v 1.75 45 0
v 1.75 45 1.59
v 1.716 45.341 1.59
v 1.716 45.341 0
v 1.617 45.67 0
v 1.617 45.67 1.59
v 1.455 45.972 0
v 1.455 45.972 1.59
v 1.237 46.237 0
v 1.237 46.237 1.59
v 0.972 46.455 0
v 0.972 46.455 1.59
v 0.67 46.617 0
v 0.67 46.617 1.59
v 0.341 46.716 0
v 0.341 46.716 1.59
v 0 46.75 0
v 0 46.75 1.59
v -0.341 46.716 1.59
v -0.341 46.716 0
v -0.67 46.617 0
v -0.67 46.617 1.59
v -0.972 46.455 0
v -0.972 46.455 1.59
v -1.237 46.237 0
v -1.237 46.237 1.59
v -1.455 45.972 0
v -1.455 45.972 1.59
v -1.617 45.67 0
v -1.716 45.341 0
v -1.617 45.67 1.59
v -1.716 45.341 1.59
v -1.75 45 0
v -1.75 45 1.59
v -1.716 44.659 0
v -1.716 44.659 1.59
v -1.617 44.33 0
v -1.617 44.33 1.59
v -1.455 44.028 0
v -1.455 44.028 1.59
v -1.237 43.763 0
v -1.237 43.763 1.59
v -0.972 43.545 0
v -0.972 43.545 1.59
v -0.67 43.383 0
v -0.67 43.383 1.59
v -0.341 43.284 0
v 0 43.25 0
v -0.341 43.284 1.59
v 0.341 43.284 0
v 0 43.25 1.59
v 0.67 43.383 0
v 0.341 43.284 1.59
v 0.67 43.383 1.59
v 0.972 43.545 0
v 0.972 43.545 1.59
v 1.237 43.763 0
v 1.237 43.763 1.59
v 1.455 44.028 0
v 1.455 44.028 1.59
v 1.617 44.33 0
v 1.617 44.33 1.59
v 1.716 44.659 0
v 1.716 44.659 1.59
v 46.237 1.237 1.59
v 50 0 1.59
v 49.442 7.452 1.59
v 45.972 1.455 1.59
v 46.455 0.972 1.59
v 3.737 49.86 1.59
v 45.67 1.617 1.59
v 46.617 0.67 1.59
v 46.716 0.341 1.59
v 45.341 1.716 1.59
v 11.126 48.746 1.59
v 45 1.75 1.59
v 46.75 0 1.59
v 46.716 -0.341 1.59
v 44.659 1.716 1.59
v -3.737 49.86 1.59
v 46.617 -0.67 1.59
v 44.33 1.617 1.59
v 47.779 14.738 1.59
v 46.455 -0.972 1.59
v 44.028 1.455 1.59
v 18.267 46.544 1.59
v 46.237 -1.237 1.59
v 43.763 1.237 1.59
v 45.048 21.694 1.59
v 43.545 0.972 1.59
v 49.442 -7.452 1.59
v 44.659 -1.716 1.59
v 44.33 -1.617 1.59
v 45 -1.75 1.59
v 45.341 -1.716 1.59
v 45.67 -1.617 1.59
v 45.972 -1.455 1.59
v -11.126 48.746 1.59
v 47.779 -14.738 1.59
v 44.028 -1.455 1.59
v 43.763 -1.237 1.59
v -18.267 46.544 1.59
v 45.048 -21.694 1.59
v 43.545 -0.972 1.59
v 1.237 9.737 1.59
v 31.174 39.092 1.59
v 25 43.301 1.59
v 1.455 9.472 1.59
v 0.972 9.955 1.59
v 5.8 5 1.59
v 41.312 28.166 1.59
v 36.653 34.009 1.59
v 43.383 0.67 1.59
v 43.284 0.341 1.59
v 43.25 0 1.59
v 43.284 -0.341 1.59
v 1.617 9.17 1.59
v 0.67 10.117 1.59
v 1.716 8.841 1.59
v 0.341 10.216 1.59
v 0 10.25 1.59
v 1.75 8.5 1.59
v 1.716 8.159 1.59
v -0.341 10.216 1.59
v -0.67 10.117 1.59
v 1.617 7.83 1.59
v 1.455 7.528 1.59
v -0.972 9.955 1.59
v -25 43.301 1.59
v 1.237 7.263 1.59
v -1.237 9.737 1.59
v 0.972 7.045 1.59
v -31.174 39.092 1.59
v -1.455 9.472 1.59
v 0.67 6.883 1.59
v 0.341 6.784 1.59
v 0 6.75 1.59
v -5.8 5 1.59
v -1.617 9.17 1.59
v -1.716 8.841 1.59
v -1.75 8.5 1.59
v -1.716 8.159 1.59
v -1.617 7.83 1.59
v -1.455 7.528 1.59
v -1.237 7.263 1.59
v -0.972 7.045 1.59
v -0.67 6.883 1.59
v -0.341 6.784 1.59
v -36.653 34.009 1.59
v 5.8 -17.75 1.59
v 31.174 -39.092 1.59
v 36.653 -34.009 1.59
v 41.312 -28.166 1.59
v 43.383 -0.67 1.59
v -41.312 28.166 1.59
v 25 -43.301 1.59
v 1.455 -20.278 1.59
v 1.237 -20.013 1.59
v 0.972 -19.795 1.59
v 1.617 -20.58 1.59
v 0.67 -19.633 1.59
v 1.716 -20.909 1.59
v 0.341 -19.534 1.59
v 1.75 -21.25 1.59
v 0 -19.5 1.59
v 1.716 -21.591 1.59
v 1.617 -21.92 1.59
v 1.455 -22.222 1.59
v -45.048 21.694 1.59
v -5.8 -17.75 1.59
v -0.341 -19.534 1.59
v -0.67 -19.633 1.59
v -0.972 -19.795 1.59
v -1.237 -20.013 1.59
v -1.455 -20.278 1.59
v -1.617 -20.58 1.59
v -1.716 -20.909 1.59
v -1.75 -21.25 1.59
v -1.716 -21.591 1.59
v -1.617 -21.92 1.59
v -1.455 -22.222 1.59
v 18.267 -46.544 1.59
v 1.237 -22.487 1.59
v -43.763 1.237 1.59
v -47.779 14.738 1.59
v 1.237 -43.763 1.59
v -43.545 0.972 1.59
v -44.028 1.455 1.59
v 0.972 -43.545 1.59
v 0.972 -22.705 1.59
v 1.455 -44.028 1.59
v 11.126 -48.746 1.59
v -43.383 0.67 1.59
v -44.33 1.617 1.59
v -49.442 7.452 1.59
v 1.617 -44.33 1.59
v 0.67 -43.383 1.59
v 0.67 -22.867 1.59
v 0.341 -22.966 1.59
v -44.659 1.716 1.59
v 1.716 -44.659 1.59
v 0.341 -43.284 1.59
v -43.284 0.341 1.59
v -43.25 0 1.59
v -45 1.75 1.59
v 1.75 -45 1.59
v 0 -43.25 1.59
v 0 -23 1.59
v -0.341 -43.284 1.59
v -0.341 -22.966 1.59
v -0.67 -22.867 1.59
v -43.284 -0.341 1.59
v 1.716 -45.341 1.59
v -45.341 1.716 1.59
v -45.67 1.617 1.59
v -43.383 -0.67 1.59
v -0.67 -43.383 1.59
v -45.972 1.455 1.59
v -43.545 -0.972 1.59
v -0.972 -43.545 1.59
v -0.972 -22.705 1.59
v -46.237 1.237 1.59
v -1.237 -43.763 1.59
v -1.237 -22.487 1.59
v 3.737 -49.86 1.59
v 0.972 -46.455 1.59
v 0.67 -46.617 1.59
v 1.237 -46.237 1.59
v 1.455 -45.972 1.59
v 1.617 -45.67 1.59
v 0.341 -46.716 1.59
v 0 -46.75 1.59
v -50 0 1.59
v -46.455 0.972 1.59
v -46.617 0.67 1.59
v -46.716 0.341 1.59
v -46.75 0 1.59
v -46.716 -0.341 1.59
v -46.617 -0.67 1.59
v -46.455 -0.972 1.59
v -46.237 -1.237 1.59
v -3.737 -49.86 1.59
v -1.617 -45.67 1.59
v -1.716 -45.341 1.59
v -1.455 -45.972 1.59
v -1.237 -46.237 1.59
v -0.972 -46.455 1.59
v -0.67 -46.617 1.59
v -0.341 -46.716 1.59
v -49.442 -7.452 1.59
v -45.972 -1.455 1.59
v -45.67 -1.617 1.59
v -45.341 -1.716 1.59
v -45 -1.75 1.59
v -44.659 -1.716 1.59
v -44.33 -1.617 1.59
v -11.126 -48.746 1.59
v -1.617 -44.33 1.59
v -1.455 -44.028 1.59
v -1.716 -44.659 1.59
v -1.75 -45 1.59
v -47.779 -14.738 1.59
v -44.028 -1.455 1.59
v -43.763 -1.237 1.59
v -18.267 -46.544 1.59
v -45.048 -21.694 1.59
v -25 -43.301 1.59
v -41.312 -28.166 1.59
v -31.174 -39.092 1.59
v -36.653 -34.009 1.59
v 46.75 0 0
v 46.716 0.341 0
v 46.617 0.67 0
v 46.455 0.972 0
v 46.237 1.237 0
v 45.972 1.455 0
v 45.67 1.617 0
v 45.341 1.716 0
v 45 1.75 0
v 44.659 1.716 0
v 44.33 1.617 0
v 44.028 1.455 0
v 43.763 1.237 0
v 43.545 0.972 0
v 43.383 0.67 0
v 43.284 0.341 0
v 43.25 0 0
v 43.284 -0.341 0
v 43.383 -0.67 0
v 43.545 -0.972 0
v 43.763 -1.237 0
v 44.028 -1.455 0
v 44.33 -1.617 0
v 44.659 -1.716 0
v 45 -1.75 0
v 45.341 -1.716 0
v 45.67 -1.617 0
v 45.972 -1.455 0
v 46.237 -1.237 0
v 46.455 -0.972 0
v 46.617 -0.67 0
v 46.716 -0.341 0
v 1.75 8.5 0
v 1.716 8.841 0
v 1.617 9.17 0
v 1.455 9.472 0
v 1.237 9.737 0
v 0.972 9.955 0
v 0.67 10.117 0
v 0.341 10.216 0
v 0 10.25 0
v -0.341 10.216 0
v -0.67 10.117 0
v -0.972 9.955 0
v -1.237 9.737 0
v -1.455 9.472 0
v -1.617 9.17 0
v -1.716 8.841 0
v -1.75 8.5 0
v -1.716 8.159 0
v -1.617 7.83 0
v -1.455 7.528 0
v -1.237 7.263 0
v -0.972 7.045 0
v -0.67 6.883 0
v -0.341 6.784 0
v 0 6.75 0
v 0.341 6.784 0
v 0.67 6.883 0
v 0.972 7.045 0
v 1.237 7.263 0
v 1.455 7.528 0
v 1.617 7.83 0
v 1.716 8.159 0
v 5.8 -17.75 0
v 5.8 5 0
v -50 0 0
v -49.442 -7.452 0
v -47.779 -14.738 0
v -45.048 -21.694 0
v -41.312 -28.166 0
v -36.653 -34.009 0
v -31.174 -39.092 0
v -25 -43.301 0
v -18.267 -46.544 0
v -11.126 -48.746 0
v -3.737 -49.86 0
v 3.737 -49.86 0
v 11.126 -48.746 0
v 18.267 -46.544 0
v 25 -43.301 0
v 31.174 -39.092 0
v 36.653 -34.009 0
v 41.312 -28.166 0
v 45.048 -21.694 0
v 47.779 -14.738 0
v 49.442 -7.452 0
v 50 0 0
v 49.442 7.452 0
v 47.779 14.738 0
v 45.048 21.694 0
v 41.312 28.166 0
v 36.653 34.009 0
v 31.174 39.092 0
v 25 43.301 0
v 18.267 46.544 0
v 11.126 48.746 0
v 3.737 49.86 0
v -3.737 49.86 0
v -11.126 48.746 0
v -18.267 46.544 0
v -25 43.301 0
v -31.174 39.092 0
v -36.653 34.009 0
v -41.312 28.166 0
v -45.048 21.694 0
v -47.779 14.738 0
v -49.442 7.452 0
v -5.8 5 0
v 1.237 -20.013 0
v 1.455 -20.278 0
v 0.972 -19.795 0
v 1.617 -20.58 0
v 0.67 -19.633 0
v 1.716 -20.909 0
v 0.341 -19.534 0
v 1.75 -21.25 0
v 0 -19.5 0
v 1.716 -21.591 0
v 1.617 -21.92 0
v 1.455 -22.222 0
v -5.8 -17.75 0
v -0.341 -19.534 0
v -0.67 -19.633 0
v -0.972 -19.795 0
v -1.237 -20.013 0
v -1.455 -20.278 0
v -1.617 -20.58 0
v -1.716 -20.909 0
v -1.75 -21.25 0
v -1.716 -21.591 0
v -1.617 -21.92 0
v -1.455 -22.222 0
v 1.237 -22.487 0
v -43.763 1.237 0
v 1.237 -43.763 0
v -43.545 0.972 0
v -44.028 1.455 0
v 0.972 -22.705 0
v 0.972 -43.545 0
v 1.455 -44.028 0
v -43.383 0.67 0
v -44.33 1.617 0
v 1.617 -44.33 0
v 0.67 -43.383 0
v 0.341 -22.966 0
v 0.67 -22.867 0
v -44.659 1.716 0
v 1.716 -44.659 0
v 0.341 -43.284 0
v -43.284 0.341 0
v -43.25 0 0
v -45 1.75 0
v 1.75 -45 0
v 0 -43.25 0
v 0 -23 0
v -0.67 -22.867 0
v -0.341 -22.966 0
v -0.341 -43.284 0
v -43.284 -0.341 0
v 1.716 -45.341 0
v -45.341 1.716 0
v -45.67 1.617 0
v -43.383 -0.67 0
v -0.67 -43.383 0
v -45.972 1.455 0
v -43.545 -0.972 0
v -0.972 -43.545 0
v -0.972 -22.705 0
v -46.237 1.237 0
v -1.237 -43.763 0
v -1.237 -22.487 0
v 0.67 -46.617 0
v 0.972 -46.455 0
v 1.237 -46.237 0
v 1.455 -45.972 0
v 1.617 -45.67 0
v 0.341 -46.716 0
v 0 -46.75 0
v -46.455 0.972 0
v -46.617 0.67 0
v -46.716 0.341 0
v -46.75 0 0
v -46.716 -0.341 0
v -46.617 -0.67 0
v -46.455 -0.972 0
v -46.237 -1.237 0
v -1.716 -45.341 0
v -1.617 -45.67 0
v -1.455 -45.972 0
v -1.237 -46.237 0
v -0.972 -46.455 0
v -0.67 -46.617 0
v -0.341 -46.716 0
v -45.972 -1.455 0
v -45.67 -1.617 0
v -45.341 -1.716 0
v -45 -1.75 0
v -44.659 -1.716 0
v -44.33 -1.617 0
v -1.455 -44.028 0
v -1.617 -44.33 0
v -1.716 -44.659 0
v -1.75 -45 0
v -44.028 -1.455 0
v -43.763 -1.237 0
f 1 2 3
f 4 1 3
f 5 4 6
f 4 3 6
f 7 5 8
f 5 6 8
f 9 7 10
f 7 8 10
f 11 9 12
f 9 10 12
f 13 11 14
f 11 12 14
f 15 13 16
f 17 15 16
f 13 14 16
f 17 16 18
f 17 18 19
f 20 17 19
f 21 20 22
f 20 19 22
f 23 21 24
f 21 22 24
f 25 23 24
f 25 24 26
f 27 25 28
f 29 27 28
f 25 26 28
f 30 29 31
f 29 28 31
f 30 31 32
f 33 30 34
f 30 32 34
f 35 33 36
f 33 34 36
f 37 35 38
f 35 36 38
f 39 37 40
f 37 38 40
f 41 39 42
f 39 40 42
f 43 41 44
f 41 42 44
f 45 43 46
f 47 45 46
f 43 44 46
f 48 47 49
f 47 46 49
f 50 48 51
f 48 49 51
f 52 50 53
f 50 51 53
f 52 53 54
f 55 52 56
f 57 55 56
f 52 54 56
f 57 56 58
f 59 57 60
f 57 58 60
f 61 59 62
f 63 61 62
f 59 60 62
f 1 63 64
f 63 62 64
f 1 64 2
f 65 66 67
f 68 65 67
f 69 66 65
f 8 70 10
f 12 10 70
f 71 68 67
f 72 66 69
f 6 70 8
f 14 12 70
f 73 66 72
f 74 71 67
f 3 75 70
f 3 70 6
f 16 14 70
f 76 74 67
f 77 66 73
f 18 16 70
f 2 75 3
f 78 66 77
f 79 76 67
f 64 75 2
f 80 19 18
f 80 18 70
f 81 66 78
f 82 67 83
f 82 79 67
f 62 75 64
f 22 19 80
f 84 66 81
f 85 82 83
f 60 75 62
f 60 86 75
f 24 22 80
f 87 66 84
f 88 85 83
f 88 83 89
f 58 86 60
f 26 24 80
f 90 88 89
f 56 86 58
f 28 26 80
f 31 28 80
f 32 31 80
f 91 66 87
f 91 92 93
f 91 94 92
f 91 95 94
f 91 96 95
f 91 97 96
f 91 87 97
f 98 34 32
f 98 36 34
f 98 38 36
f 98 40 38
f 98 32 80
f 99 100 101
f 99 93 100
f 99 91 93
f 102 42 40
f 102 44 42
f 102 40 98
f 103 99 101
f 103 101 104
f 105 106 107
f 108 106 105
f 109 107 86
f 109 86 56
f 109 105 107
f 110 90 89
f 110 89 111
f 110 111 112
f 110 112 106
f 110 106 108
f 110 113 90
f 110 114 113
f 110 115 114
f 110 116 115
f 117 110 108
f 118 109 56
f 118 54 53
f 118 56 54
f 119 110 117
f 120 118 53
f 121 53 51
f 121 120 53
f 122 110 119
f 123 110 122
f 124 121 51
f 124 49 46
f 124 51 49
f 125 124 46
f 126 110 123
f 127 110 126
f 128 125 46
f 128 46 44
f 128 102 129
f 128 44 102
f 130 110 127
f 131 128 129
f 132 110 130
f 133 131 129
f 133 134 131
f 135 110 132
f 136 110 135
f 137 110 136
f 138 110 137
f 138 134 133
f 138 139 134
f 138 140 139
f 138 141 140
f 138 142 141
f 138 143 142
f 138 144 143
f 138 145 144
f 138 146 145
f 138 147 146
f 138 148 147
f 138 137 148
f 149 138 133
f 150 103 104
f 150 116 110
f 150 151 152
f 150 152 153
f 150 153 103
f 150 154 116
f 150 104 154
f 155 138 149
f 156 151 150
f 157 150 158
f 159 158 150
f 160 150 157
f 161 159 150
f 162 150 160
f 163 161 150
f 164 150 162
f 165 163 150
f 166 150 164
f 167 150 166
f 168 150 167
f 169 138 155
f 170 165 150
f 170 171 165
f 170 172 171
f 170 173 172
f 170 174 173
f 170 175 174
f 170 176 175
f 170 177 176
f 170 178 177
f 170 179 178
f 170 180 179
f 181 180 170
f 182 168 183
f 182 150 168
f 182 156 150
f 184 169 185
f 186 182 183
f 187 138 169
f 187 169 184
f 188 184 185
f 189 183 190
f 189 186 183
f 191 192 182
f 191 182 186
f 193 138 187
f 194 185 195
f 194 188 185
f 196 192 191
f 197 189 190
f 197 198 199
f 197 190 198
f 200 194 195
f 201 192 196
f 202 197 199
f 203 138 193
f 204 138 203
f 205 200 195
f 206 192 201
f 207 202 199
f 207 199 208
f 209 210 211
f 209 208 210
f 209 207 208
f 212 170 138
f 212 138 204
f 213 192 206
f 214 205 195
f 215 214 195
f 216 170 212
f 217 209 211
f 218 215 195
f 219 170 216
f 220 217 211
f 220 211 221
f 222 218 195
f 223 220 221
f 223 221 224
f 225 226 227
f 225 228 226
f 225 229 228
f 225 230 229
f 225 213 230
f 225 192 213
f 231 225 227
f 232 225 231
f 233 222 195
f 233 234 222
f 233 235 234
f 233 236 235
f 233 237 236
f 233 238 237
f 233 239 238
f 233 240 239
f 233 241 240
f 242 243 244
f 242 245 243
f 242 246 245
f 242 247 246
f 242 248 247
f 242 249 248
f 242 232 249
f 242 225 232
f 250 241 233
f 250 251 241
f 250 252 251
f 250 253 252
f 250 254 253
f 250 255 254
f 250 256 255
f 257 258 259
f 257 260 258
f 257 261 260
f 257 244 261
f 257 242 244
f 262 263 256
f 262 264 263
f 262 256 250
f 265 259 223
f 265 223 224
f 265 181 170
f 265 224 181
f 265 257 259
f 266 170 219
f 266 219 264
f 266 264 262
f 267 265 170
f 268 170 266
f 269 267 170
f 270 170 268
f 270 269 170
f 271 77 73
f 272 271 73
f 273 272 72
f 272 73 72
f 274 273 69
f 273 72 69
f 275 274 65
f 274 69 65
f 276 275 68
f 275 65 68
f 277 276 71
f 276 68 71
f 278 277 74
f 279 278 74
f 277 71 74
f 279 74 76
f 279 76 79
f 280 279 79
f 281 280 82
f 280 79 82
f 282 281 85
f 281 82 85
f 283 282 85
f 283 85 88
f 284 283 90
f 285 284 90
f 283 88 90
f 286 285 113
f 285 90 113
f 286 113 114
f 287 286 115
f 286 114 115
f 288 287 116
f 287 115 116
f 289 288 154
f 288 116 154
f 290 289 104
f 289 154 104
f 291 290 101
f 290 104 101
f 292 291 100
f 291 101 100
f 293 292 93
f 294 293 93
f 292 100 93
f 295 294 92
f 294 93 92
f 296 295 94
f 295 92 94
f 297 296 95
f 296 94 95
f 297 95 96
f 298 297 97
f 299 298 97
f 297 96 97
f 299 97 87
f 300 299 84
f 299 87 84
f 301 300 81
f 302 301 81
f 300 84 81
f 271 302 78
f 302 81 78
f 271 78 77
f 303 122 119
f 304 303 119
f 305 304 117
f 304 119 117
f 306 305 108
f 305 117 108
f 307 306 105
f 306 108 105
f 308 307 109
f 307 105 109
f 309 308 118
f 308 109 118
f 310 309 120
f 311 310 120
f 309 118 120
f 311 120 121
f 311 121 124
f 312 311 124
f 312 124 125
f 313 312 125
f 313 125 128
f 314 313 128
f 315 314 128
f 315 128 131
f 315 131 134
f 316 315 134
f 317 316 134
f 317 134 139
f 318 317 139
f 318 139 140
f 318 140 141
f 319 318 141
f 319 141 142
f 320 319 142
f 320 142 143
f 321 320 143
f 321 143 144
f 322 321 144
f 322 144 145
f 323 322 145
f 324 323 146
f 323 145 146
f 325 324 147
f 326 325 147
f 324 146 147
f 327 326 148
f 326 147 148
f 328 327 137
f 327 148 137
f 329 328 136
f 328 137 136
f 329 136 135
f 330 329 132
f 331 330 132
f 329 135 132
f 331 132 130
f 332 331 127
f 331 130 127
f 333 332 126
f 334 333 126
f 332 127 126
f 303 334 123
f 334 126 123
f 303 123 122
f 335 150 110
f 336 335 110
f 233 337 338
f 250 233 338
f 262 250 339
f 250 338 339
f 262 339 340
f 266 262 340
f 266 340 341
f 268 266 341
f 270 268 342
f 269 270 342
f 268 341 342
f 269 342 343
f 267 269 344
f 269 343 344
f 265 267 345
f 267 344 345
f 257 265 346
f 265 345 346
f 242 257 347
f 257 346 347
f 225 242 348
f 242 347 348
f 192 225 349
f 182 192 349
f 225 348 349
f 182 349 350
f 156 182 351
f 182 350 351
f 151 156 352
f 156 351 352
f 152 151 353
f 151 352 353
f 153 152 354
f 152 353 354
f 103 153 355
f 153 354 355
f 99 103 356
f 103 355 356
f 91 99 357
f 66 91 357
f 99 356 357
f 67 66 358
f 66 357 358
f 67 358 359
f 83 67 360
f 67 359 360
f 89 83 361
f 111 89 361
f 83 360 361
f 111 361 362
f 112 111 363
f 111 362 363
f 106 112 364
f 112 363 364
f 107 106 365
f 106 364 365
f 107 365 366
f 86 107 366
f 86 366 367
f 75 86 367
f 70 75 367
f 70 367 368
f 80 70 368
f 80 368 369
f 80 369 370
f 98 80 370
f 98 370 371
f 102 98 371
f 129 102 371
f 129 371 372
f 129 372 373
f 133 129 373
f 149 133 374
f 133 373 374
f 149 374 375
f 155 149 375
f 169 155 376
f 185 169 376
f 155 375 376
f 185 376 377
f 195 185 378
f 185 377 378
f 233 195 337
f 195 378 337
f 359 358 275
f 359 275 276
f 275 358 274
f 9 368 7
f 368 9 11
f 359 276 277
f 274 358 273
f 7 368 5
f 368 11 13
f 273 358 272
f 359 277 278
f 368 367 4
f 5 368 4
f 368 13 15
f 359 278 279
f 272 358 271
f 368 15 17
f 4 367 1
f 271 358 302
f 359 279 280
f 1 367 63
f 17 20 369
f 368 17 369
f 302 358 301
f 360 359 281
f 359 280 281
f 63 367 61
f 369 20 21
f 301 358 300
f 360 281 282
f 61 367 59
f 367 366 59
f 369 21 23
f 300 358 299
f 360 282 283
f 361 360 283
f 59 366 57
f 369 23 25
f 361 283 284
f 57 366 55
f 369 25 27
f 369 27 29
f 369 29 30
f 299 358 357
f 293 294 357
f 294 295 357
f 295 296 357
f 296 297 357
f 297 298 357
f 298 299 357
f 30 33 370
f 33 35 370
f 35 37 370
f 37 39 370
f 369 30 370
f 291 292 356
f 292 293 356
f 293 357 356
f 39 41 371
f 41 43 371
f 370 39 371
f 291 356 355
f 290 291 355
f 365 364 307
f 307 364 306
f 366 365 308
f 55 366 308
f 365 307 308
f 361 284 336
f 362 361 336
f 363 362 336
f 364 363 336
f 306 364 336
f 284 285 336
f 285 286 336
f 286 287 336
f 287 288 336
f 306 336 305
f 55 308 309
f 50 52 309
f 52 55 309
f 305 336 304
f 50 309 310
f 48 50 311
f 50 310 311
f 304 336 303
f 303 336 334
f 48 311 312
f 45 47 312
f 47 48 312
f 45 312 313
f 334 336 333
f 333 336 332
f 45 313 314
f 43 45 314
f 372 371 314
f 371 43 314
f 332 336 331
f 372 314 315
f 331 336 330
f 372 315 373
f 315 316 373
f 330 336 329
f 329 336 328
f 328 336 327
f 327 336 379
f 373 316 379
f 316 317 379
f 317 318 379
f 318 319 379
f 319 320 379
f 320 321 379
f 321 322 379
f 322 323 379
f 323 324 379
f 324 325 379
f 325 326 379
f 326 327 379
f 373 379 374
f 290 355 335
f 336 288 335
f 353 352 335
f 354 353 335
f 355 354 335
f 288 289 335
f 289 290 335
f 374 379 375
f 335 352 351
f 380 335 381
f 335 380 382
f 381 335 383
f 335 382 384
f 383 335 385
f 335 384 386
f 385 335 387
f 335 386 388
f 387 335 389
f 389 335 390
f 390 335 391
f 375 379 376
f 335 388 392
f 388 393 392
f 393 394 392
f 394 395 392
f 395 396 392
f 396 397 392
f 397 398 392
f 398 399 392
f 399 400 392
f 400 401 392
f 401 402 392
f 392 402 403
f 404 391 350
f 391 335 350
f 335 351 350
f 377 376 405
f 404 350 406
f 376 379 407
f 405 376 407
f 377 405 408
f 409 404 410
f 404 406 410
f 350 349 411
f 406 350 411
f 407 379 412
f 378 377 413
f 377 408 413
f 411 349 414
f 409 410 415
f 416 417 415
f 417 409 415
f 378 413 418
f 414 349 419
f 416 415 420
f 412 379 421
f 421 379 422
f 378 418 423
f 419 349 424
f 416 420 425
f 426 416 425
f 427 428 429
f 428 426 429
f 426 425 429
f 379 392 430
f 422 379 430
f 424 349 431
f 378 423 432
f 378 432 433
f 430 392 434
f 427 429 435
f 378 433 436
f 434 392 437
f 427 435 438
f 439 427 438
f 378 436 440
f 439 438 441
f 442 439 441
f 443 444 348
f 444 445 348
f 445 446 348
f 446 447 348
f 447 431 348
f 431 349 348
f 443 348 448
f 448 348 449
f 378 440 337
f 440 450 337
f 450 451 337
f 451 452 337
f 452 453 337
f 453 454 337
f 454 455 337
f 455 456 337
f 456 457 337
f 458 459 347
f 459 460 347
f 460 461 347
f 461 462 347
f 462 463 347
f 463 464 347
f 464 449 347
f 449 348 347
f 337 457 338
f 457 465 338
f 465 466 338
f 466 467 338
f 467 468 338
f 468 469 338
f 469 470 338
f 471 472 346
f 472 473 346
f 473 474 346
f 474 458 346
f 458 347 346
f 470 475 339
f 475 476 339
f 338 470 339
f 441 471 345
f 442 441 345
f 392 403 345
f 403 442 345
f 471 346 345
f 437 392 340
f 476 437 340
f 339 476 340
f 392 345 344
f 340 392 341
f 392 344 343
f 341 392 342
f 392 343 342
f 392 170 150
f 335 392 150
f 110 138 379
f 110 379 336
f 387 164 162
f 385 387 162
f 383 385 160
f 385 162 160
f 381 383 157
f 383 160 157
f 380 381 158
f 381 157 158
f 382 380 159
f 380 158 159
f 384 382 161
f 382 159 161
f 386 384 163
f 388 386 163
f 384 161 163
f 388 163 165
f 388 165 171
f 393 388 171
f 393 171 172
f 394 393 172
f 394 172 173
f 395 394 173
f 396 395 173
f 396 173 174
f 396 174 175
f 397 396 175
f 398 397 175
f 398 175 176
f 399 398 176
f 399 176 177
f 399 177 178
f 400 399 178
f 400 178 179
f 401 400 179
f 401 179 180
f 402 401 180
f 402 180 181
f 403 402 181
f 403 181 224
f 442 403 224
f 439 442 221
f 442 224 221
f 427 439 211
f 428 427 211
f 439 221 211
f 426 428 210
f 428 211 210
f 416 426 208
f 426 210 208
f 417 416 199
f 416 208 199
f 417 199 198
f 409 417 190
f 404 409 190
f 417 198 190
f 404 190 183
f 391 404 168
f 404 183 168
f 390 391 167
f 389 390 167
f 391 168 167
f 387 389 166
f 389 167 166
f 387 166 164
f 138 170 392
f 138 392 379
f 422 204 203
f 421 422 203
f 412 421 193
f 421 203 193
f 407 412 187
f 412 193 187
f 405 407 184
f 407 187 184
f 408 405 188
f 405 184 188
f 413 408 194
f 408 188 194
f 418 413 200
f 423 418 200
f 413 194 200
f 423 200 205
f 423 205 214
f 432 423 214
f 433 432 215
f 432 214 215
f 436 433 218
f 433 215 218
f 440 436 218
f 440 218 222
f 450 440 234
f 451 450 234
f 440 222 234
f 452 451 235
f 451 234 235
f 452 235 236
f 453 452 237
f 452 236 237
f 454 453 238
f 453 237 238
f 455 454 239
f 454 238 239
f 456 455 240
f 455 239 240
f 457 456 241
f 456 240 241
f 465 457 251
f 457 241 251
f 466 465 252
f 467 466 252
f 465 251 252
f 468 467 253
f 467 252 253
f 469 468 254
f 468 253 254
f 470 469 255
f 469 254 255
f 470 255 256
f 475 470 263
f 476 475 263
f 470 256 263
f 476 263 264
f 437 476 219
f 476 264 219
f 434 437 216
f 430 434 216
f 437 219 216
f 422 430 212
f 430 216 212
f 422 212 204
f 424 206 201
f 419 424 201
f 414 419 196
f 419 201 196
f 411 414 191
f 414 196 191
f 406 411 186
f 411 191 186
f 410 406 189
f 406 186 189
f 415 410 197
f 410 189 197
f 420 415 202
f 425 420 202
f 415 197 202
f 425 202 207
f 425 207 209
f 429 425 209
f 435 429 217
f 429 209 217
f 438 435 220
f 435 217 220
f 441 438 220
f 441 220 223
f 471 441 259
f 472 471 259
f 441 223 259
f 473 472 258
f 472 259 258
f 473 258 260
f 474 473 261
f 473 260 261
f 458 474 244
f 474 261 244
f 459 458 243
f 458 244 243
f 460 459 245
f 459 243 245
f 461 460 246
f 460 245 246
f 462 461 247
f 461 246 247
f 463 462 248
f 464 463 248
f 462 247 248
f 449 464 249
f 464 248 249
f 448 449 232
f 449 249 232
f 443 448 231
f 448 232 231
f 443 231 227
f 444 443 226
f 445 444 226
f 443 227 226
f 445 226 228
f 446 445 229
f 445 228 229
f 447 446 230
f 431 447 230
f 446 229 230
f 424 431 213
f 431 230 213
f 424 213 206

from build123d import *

# Parameters (mm, degrees)
SKETCH1_R           = 50
BOSS_EXTRUDE1_DEPTH = 1.59
SKETCH2_R           = 1.75
CUT_EXTRUDE1_DEPTH  = 1.59
SKETCH3_R           = 1.75
SKETCH3_W           = 11.6
SKETCH3_H           = 22.75
CUT_EXTRUDE2_DEPTH  = 10


with BuildPart() as part:
    # Sketch1 → Boss-Extrude1 (new body)
    with BuildSketch(Plane.XY):
        with Locations(Location((0, 0, 0), (0, 0, 180))):
            Circle(SKETCH1_R)
    extrude(amount=BOSS_EXTRUDE1_DEPTH)

    # Sketch2 → Cut-Extrude1 (cut)
    with BuildSketch(Plane.XY.offset(1.59)):
        with Locations((0, 45)):
            Circle(SKETCH2_R)
        with Locations((45, 0)):
            Circle(SKETCH2_R)
        with Locations((0, -45)):
            Circle(SKETCH2_R)
        with Locations((-45, 0)):
            Circle(SKETCH2_R)
    extrude(amount=-CUT_EXTRUDE1_DEPTH, mode=Mode.SUBTRACT)

    # Sketch3 → Cut-Extrude2 (cut)
    with BuildSketch(Plane.XY.offset(1.59)):
        with Locations((0, 8.5)):
            Circle(SKETCH3_R)
        with Locations((0, -21.25)):
            Circle(SKETCH3_R)
        with Locations((0, -6.375)):
            Rectangle(SKETCH3_W, SKETCH3_H)
    extrude(amount=-CUT_EXTRUDE2_DEPTH, mode=Mode.SUBTRACT)


solid = part.part
